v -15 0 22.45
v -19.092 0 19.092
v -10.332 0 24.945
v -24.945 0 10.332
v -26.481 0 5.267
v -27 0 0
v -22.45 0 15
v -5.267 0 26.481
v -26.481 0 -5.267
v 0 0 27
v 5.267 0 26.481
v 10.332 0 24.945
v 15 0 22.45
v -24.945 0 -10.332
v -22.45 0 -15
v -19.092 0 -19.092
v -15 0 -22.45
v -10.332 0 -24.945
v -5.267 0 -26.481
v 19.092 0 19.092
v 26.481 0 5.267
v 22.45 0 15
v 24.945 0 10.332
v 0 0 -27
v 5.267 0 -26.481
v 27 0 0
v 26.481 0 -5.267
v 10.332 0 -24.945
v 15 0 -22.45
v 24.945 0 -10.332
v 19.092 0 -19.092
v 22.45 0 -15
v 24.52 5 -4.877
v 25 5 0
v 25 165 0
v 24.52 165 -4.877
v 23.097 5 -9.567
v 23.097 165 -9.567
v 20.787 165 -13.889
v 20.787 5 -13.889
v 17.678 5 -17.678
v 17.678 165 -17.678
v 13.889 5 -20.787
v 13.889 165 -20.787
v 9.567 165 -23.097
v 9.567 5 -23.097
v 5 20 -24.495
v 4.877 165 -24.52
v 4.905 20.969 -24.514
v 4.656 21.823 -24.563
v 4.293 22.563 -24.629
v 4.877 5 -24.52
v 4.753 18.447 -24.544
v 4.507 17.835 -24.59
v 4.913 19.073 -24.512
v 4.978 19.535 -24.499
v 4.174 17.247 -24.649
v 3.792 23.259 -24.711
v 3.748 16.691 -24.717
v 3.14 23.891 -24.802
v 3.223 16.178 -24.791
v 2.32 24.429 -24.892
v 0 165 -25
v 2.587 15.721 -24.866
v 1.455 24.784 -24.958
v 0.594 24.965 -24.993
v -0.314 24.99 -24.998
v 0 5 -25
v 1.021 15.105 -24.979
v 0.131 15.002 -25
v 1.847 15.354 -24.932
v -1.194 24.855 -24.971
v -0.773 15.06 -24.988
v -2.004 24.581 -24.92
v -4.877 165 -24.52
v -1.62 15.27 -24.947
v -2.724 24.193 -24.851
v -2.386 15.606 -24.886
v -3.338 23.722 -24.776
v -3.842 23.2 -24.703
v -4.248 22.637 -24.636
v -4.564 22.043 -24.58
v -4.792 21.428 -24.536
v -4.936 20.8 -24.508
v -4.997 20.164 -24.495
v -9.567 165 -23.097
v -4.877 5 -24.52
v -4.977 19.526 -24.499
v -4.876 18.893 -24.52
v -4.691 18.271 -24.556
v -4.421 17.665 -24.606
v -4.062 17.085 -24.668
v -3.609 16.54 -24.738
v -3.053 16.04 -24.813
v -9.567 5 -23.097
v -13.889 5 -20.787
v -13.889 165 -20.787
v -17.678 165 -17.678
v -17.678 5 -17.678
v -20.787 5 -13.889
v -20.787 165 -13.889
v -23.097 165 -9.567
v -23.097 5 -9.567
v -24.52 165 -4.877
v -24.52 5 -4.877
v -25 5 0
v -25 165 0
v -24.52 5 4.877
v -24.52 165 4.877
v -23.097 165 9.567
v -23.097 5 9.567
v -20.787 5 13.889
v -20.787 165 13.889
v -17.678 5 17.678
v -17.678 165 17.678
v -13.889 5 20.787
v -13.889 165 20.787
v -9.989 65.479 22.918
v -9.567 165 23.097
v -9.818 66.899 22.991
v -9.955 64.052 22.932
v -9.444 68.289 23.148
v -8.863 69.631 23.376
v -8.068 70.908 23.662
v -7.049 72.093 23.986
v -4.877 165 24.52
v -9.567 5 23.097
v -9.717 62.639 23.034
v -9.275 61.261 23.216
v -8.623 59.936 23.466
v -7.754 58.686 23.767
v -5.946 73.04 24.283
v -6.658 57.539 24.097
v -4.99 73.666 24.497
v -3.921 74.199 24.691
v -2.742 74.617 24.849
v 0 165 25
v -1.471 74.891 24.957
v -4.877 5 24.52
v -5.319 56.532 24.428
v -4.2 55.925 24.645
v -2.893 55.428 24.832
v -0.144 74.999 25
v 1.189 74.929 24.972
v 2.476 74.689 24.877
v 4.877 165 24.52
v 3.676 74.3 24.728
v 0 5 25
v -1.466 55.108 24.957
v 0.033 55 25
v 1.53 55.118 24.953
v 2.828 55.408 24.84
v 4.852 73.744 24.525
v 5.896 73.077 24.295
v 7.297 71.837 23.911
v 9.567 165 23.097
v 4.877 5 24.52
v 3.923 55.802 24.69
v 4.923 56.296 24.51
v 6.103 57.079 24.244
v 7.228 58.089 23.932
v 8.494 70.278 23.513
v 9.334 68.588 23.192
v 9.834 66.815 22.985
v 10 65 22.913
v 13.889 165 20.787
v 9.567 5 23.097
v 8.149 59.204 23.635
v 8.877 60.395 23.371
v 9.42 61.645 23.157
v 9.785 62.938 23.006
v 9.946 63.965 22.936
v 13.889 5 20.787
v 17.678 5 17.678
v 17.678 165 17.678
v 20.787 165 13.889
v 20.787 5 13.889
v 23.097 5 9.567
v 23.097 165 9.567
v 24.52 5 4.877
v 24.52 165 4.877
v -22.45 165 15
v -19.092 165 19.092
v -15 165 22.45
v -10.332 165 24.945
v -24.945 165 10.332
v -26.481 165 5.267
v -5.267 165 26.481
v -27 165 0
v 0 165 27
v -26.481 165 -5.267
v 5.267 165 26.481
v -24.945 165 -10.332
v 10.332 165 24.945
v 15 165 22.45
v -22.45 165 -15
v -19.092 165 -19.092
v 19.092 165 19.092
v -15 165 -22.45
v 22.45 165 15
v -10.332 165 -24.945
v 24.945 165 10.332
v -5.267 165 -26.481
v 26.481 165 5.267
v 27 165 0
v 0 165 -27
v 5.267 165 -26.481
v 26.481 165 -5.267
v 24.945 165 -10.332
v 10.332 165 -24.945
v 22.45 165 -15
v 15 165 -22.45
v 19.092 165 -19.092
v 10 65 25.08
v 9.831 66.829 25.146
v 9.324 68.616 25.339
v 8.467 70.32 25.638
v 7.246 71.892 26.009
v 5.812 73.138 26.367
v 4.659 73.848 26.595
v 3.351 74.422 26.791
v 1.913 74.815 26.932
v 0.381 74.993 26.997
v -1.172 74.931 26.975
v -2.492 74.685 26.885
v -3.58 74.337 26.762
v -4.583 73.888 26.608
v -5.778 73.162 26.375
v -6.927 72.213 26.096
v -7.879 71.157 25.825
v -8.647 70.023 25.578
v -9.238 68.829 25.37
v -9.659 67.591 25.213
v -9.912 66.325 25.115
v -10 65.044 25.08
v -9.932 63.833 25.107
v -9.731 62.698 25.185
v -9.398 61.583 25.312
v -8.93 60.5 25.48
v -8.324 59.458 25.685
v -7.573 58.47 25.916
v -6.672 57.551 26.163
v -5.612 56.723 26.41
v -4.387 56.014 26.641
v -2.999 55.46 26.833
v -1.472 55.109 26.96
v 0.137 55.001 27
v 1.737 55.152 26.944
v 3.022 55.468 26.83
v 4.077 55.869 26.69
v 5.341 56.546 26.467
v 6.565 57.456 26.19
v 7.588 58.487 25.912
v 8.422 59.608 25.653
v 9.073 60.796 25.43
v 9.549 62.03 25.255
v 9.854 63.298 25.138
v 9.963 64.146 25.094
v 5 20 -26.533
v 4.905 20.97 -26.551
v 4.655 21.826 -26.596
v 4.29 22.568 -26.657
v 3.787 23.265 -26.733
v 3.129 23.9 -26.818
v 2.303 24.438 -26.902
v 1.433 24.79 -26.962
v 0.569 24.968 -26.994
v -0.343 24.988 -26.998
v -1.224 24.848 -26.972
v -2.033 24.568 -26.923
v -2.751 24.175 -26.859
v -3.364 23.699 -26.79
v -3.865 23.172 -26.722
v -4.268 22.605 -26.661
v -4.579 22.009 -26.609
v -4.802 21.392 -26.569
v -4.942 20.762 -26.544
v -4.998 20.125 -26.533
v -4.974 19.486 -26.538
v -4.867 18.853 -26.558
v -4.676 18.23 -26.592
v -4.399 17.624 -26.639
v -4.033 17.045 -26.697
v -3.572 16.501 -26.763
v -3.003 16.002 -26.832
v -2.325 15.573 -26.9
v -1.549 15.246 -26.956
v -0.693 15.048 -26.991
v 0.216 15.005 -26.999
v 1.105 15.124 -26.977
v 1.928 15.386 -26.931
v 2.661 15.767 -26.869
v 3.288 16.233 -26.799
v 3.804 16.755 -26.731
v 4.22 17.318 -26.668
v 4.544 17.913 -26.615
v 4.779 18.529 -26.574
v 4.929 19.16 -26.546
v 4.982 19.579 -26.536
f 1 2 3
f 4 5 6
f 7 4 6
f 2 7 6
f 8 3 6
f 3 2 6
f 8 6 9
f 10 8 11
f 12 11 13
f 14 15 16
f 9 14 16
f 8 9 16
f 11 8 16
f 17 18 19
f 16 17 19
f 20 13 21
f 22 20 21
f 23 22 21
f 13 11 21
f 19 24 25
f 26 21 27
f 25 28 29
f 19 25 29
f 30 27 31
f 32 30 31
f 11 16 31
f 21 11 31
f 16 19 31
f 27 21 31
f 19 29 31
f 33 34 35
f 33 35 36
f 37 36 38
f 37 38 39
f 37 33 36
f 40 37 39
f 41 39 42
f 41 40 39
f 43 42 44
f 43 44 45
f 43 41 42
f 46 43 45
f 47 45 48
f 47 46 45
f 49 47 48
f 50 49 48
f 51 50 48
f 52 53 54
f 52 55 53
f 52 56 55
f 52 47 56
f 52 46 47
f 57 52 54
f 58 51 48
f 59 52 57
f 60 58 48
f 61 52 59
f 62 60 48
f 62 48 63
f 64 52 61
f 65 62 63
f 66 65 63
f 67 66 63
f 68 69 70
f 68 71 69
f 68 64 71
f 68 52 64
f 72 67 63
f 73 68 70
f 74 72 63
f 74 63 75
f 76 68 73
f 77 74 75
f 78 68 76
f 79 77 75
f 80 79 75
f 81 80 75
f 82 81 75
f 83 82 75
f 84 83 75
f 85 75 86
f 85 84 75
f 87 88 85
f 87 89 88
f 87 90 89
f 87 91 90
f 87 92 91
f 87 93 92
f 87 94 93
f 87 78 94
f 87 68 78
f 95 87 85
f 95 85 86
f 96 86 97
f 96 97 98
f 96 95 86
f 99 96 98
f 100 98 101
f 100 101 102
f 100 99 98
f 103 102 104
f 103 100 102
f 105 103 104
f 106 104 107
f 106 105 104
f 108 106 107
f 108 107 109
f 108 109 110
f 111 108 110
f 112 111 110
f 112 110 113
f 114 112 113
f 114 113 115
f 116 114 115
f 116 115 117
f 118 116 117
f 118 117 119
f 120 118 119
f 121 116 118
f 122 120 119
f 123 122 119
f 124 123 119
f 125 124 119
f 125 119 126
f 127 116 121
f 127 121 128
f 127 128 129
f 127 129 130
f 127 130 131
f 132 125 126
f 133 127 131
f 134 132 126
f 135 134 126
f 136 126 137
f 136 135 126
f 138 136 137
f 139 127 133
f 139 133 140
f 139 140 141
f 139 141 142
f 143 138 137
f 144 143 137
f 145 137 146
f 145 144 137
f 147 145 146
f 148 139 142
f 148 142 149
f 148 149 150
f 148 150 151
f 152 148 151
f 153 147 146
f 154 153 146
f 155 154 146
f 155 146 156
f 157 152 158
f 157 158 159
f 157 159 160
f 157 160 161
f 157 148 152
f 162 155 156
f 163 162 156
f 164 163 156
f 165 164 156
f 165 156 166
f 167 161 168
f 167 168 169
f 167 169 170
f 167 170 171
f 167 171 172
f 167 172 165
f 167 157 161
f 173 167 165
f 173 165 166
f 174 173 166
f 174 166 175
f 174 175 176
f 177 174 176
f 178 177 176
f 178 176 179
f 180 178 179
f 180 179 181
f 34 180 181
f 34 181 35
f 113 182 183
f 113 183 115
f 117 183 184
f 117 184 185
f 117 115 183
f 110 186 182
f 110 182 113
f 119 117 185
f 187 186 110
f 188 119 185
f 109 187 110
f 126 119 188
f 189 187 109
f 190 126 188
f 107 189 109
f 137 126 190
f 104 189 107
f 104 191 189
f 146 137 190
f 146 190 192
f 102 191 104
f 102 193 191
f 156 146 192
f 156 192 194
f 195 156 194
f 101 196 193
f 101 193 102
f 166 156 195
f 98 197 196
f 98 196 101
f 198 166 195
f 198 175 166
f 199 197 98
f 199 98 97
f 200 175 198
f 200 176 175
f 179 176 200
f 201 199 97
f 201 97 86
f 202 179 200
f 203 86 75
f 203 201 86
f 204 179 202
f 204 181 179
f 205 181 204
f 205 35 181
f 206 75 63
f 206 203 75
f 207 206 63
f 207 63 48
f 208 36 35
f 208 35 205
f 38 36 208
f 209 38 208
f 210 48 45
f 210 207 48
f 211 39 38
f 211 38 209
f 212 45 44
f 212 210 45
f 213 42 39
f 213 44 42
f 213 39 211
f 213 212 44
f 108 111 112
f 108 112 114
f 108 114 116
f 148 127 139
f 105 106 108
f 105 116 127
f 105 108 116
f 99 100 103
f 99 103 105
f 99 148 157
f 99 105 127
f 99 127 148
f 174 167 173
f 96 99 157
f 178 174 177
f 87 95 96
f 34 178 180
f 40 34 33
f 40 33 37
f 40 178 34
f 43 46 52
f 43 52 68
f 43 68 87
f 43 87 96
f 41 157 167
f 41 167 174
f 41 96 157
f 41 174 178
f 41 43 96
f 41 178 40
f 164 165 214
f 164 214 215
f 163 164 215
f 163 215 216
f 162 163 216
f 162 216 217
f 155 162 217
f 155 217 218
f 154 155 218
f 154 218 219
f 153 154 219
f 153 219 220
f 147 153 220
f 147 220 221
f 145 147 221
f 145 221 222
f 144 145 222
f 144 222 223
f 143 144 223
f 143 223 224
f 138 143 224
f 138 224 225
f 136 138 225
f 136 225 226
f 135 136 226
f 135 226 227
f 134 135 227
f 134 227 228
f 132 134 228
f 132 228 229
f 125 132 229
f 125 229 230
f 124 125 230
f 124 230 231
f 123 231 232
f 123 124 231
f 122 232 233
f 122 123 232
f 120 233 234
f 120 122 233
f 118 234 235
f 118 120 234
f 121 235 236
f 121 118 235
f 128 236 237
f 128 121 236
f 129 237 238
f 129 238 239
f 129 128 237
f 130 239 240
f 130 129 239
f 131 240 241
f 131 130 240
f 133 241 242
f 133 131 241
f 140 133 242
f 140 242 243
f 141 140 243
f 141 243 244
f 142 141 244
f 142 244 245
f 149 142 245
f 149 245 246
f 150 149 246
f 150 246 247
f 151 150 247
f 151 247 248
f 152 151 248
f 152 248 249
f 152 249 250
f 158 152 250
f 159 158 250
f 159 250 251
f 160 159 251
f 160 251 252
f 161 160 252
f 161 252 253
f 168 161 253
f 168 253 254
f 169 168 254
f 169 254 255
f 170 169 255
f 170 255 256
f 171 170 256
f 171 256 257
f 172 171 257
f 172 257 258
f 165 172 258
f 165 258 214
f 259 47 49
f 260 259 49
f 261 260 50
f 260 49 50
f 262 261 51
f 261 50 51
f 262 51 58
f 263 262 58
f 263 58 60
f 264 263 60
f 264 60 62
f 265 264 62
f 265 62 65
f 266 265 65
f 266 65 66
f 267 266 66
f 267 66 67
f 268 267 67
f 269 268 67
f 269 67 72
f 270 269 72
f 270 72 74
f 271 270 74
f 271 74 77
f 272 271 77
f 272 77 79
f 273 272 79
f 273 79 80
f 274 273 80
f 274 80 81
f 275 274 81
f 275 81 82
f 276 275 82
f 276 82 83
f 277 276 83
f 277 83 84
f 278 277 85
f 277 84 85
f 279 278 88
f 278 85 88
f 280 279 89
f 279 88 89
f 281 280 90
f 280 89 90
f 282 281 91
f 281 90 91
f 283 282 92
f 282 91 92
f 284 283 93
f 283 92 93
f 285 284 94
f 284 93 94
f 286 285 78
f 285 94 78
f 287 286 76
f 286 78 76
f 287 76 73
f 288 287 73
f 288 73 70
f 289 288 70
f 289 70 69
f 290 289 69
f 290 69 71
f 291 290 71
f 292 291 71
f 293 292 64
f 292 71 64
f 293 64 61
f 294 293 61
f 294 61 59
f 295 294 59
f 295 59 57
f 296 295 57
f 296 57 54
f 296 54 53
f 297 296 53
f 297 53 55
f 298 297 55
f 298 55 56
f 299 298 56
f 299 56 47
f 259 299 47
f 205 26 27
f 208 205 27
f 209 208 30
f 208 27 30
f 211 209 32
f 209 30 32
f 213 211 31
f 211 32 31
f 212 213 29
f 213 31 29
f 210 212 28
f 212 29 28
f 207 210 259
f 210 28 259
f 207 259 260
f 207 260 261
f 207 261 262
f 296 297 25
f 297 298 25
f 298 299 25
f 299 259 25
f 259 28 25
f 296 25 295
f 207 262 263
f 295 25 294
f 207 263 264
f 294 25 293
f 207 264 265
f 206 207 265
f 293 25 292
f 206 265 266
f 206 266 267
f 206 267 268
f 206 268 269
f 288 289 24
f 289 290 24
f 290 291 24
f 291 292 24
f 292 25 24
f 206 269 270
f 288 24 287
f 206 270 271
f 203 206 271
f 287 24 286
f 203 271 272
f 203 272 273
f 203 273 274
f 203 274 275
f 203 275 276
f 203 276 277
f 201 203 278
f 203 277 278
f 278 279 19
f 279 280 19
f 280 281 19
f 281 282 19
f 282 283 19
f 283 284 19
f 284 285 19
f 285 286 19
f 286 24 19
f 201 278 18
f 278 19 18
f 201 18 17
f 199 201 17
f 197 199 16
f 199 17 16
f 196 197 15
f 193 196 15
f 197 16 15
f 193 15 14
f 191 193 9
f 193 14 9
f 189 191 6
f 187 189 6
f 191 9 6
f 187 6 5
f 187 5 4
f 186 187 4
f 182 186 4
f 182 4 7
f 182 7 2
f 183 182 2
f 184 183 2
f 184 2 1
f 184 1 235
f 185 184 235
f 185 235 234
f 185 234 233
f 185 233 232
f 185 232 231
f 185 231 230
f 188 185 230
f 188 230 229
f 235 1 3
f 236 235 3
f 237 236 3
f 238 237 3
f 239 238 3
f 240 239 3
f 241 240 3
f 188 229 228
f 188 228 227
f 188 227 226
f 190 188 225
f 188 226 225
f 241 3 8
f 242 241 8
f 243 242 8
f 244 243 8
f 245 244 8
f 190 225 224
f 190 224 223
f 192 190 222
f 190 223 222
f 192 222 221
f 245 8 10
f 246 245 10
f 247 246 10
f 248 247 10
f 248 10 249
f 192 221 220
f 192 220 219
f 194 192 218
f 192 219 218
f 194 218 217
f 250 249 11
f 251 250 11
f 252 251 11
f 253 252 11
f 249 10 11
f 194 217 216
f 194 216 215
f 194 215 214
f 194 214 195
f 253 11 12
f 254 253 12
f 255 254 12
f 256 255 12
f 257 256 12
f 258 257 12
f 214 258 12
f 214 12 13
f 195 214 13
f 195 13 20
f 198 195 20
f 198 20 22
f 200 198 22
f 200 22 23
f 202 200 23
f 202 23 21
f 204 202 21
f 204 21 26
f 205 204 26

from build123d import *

# Parameters (mm, degrees)
SKETCH1_R           = 27
BOSS_EXTRUDE1_DEPTH = 5
SKETCH2_R           = 27
SKETCH2_R_2         = 25
BOSS_EXTRUDE2_DEPTH = 160
SKETCH3_R           = 5
CUT_EXTRUDE1_DEPTH  = 160
SKETCH4_R           = 10
CUT_EXTRUDE6_DEPTH  = 41


with BuildPart() as part:
    # Sketch1 → Boss-Extrude1 (new body)
    with BuildSketch(Plane(origin=(0, 0, 0), x_dir=(1, 0, 0), z_dir=(0, 1, 0))):
        Circle(SKETCH1_R)
    extrude(amount=BOSS_EXTRUDE1_DEPTH)

    # Sketch2 → Boss-Extrude2 (add)
    with BuildSketch(Plane(origin=(0, 5, 0), x_dir=(1, 0, 0), z_dir=(0, 1, 0))):
        Circle(SKETCH2_R)
        Circle(SKETCH2_R_2, mode=Mode.SUBTRACT)
    extrude(amount=BOSS_EXTRUDE2_DEPTH)

    # Sketch3 → Cut-Extrude1 (cut)
    with BuildSketch(Plane.XY):
        with Locations((0, 20)):
            Circle(SKETCH3_R)
    extrude(amount=-CUT_EXTRUDE1_DEPTH, mode=Mode.SUBTRACT)

    # Sketch4 → Cut-Extrude6 (cut)
    with BuildSketch(Plane.XY):
        with Locations((0, 65)):
            Circle(SKETCH4_R)
    extrude(amount=CUT_EXTRUDE6_DEPTH, mode=Mode.SUBTRACT)


solid = part.part
